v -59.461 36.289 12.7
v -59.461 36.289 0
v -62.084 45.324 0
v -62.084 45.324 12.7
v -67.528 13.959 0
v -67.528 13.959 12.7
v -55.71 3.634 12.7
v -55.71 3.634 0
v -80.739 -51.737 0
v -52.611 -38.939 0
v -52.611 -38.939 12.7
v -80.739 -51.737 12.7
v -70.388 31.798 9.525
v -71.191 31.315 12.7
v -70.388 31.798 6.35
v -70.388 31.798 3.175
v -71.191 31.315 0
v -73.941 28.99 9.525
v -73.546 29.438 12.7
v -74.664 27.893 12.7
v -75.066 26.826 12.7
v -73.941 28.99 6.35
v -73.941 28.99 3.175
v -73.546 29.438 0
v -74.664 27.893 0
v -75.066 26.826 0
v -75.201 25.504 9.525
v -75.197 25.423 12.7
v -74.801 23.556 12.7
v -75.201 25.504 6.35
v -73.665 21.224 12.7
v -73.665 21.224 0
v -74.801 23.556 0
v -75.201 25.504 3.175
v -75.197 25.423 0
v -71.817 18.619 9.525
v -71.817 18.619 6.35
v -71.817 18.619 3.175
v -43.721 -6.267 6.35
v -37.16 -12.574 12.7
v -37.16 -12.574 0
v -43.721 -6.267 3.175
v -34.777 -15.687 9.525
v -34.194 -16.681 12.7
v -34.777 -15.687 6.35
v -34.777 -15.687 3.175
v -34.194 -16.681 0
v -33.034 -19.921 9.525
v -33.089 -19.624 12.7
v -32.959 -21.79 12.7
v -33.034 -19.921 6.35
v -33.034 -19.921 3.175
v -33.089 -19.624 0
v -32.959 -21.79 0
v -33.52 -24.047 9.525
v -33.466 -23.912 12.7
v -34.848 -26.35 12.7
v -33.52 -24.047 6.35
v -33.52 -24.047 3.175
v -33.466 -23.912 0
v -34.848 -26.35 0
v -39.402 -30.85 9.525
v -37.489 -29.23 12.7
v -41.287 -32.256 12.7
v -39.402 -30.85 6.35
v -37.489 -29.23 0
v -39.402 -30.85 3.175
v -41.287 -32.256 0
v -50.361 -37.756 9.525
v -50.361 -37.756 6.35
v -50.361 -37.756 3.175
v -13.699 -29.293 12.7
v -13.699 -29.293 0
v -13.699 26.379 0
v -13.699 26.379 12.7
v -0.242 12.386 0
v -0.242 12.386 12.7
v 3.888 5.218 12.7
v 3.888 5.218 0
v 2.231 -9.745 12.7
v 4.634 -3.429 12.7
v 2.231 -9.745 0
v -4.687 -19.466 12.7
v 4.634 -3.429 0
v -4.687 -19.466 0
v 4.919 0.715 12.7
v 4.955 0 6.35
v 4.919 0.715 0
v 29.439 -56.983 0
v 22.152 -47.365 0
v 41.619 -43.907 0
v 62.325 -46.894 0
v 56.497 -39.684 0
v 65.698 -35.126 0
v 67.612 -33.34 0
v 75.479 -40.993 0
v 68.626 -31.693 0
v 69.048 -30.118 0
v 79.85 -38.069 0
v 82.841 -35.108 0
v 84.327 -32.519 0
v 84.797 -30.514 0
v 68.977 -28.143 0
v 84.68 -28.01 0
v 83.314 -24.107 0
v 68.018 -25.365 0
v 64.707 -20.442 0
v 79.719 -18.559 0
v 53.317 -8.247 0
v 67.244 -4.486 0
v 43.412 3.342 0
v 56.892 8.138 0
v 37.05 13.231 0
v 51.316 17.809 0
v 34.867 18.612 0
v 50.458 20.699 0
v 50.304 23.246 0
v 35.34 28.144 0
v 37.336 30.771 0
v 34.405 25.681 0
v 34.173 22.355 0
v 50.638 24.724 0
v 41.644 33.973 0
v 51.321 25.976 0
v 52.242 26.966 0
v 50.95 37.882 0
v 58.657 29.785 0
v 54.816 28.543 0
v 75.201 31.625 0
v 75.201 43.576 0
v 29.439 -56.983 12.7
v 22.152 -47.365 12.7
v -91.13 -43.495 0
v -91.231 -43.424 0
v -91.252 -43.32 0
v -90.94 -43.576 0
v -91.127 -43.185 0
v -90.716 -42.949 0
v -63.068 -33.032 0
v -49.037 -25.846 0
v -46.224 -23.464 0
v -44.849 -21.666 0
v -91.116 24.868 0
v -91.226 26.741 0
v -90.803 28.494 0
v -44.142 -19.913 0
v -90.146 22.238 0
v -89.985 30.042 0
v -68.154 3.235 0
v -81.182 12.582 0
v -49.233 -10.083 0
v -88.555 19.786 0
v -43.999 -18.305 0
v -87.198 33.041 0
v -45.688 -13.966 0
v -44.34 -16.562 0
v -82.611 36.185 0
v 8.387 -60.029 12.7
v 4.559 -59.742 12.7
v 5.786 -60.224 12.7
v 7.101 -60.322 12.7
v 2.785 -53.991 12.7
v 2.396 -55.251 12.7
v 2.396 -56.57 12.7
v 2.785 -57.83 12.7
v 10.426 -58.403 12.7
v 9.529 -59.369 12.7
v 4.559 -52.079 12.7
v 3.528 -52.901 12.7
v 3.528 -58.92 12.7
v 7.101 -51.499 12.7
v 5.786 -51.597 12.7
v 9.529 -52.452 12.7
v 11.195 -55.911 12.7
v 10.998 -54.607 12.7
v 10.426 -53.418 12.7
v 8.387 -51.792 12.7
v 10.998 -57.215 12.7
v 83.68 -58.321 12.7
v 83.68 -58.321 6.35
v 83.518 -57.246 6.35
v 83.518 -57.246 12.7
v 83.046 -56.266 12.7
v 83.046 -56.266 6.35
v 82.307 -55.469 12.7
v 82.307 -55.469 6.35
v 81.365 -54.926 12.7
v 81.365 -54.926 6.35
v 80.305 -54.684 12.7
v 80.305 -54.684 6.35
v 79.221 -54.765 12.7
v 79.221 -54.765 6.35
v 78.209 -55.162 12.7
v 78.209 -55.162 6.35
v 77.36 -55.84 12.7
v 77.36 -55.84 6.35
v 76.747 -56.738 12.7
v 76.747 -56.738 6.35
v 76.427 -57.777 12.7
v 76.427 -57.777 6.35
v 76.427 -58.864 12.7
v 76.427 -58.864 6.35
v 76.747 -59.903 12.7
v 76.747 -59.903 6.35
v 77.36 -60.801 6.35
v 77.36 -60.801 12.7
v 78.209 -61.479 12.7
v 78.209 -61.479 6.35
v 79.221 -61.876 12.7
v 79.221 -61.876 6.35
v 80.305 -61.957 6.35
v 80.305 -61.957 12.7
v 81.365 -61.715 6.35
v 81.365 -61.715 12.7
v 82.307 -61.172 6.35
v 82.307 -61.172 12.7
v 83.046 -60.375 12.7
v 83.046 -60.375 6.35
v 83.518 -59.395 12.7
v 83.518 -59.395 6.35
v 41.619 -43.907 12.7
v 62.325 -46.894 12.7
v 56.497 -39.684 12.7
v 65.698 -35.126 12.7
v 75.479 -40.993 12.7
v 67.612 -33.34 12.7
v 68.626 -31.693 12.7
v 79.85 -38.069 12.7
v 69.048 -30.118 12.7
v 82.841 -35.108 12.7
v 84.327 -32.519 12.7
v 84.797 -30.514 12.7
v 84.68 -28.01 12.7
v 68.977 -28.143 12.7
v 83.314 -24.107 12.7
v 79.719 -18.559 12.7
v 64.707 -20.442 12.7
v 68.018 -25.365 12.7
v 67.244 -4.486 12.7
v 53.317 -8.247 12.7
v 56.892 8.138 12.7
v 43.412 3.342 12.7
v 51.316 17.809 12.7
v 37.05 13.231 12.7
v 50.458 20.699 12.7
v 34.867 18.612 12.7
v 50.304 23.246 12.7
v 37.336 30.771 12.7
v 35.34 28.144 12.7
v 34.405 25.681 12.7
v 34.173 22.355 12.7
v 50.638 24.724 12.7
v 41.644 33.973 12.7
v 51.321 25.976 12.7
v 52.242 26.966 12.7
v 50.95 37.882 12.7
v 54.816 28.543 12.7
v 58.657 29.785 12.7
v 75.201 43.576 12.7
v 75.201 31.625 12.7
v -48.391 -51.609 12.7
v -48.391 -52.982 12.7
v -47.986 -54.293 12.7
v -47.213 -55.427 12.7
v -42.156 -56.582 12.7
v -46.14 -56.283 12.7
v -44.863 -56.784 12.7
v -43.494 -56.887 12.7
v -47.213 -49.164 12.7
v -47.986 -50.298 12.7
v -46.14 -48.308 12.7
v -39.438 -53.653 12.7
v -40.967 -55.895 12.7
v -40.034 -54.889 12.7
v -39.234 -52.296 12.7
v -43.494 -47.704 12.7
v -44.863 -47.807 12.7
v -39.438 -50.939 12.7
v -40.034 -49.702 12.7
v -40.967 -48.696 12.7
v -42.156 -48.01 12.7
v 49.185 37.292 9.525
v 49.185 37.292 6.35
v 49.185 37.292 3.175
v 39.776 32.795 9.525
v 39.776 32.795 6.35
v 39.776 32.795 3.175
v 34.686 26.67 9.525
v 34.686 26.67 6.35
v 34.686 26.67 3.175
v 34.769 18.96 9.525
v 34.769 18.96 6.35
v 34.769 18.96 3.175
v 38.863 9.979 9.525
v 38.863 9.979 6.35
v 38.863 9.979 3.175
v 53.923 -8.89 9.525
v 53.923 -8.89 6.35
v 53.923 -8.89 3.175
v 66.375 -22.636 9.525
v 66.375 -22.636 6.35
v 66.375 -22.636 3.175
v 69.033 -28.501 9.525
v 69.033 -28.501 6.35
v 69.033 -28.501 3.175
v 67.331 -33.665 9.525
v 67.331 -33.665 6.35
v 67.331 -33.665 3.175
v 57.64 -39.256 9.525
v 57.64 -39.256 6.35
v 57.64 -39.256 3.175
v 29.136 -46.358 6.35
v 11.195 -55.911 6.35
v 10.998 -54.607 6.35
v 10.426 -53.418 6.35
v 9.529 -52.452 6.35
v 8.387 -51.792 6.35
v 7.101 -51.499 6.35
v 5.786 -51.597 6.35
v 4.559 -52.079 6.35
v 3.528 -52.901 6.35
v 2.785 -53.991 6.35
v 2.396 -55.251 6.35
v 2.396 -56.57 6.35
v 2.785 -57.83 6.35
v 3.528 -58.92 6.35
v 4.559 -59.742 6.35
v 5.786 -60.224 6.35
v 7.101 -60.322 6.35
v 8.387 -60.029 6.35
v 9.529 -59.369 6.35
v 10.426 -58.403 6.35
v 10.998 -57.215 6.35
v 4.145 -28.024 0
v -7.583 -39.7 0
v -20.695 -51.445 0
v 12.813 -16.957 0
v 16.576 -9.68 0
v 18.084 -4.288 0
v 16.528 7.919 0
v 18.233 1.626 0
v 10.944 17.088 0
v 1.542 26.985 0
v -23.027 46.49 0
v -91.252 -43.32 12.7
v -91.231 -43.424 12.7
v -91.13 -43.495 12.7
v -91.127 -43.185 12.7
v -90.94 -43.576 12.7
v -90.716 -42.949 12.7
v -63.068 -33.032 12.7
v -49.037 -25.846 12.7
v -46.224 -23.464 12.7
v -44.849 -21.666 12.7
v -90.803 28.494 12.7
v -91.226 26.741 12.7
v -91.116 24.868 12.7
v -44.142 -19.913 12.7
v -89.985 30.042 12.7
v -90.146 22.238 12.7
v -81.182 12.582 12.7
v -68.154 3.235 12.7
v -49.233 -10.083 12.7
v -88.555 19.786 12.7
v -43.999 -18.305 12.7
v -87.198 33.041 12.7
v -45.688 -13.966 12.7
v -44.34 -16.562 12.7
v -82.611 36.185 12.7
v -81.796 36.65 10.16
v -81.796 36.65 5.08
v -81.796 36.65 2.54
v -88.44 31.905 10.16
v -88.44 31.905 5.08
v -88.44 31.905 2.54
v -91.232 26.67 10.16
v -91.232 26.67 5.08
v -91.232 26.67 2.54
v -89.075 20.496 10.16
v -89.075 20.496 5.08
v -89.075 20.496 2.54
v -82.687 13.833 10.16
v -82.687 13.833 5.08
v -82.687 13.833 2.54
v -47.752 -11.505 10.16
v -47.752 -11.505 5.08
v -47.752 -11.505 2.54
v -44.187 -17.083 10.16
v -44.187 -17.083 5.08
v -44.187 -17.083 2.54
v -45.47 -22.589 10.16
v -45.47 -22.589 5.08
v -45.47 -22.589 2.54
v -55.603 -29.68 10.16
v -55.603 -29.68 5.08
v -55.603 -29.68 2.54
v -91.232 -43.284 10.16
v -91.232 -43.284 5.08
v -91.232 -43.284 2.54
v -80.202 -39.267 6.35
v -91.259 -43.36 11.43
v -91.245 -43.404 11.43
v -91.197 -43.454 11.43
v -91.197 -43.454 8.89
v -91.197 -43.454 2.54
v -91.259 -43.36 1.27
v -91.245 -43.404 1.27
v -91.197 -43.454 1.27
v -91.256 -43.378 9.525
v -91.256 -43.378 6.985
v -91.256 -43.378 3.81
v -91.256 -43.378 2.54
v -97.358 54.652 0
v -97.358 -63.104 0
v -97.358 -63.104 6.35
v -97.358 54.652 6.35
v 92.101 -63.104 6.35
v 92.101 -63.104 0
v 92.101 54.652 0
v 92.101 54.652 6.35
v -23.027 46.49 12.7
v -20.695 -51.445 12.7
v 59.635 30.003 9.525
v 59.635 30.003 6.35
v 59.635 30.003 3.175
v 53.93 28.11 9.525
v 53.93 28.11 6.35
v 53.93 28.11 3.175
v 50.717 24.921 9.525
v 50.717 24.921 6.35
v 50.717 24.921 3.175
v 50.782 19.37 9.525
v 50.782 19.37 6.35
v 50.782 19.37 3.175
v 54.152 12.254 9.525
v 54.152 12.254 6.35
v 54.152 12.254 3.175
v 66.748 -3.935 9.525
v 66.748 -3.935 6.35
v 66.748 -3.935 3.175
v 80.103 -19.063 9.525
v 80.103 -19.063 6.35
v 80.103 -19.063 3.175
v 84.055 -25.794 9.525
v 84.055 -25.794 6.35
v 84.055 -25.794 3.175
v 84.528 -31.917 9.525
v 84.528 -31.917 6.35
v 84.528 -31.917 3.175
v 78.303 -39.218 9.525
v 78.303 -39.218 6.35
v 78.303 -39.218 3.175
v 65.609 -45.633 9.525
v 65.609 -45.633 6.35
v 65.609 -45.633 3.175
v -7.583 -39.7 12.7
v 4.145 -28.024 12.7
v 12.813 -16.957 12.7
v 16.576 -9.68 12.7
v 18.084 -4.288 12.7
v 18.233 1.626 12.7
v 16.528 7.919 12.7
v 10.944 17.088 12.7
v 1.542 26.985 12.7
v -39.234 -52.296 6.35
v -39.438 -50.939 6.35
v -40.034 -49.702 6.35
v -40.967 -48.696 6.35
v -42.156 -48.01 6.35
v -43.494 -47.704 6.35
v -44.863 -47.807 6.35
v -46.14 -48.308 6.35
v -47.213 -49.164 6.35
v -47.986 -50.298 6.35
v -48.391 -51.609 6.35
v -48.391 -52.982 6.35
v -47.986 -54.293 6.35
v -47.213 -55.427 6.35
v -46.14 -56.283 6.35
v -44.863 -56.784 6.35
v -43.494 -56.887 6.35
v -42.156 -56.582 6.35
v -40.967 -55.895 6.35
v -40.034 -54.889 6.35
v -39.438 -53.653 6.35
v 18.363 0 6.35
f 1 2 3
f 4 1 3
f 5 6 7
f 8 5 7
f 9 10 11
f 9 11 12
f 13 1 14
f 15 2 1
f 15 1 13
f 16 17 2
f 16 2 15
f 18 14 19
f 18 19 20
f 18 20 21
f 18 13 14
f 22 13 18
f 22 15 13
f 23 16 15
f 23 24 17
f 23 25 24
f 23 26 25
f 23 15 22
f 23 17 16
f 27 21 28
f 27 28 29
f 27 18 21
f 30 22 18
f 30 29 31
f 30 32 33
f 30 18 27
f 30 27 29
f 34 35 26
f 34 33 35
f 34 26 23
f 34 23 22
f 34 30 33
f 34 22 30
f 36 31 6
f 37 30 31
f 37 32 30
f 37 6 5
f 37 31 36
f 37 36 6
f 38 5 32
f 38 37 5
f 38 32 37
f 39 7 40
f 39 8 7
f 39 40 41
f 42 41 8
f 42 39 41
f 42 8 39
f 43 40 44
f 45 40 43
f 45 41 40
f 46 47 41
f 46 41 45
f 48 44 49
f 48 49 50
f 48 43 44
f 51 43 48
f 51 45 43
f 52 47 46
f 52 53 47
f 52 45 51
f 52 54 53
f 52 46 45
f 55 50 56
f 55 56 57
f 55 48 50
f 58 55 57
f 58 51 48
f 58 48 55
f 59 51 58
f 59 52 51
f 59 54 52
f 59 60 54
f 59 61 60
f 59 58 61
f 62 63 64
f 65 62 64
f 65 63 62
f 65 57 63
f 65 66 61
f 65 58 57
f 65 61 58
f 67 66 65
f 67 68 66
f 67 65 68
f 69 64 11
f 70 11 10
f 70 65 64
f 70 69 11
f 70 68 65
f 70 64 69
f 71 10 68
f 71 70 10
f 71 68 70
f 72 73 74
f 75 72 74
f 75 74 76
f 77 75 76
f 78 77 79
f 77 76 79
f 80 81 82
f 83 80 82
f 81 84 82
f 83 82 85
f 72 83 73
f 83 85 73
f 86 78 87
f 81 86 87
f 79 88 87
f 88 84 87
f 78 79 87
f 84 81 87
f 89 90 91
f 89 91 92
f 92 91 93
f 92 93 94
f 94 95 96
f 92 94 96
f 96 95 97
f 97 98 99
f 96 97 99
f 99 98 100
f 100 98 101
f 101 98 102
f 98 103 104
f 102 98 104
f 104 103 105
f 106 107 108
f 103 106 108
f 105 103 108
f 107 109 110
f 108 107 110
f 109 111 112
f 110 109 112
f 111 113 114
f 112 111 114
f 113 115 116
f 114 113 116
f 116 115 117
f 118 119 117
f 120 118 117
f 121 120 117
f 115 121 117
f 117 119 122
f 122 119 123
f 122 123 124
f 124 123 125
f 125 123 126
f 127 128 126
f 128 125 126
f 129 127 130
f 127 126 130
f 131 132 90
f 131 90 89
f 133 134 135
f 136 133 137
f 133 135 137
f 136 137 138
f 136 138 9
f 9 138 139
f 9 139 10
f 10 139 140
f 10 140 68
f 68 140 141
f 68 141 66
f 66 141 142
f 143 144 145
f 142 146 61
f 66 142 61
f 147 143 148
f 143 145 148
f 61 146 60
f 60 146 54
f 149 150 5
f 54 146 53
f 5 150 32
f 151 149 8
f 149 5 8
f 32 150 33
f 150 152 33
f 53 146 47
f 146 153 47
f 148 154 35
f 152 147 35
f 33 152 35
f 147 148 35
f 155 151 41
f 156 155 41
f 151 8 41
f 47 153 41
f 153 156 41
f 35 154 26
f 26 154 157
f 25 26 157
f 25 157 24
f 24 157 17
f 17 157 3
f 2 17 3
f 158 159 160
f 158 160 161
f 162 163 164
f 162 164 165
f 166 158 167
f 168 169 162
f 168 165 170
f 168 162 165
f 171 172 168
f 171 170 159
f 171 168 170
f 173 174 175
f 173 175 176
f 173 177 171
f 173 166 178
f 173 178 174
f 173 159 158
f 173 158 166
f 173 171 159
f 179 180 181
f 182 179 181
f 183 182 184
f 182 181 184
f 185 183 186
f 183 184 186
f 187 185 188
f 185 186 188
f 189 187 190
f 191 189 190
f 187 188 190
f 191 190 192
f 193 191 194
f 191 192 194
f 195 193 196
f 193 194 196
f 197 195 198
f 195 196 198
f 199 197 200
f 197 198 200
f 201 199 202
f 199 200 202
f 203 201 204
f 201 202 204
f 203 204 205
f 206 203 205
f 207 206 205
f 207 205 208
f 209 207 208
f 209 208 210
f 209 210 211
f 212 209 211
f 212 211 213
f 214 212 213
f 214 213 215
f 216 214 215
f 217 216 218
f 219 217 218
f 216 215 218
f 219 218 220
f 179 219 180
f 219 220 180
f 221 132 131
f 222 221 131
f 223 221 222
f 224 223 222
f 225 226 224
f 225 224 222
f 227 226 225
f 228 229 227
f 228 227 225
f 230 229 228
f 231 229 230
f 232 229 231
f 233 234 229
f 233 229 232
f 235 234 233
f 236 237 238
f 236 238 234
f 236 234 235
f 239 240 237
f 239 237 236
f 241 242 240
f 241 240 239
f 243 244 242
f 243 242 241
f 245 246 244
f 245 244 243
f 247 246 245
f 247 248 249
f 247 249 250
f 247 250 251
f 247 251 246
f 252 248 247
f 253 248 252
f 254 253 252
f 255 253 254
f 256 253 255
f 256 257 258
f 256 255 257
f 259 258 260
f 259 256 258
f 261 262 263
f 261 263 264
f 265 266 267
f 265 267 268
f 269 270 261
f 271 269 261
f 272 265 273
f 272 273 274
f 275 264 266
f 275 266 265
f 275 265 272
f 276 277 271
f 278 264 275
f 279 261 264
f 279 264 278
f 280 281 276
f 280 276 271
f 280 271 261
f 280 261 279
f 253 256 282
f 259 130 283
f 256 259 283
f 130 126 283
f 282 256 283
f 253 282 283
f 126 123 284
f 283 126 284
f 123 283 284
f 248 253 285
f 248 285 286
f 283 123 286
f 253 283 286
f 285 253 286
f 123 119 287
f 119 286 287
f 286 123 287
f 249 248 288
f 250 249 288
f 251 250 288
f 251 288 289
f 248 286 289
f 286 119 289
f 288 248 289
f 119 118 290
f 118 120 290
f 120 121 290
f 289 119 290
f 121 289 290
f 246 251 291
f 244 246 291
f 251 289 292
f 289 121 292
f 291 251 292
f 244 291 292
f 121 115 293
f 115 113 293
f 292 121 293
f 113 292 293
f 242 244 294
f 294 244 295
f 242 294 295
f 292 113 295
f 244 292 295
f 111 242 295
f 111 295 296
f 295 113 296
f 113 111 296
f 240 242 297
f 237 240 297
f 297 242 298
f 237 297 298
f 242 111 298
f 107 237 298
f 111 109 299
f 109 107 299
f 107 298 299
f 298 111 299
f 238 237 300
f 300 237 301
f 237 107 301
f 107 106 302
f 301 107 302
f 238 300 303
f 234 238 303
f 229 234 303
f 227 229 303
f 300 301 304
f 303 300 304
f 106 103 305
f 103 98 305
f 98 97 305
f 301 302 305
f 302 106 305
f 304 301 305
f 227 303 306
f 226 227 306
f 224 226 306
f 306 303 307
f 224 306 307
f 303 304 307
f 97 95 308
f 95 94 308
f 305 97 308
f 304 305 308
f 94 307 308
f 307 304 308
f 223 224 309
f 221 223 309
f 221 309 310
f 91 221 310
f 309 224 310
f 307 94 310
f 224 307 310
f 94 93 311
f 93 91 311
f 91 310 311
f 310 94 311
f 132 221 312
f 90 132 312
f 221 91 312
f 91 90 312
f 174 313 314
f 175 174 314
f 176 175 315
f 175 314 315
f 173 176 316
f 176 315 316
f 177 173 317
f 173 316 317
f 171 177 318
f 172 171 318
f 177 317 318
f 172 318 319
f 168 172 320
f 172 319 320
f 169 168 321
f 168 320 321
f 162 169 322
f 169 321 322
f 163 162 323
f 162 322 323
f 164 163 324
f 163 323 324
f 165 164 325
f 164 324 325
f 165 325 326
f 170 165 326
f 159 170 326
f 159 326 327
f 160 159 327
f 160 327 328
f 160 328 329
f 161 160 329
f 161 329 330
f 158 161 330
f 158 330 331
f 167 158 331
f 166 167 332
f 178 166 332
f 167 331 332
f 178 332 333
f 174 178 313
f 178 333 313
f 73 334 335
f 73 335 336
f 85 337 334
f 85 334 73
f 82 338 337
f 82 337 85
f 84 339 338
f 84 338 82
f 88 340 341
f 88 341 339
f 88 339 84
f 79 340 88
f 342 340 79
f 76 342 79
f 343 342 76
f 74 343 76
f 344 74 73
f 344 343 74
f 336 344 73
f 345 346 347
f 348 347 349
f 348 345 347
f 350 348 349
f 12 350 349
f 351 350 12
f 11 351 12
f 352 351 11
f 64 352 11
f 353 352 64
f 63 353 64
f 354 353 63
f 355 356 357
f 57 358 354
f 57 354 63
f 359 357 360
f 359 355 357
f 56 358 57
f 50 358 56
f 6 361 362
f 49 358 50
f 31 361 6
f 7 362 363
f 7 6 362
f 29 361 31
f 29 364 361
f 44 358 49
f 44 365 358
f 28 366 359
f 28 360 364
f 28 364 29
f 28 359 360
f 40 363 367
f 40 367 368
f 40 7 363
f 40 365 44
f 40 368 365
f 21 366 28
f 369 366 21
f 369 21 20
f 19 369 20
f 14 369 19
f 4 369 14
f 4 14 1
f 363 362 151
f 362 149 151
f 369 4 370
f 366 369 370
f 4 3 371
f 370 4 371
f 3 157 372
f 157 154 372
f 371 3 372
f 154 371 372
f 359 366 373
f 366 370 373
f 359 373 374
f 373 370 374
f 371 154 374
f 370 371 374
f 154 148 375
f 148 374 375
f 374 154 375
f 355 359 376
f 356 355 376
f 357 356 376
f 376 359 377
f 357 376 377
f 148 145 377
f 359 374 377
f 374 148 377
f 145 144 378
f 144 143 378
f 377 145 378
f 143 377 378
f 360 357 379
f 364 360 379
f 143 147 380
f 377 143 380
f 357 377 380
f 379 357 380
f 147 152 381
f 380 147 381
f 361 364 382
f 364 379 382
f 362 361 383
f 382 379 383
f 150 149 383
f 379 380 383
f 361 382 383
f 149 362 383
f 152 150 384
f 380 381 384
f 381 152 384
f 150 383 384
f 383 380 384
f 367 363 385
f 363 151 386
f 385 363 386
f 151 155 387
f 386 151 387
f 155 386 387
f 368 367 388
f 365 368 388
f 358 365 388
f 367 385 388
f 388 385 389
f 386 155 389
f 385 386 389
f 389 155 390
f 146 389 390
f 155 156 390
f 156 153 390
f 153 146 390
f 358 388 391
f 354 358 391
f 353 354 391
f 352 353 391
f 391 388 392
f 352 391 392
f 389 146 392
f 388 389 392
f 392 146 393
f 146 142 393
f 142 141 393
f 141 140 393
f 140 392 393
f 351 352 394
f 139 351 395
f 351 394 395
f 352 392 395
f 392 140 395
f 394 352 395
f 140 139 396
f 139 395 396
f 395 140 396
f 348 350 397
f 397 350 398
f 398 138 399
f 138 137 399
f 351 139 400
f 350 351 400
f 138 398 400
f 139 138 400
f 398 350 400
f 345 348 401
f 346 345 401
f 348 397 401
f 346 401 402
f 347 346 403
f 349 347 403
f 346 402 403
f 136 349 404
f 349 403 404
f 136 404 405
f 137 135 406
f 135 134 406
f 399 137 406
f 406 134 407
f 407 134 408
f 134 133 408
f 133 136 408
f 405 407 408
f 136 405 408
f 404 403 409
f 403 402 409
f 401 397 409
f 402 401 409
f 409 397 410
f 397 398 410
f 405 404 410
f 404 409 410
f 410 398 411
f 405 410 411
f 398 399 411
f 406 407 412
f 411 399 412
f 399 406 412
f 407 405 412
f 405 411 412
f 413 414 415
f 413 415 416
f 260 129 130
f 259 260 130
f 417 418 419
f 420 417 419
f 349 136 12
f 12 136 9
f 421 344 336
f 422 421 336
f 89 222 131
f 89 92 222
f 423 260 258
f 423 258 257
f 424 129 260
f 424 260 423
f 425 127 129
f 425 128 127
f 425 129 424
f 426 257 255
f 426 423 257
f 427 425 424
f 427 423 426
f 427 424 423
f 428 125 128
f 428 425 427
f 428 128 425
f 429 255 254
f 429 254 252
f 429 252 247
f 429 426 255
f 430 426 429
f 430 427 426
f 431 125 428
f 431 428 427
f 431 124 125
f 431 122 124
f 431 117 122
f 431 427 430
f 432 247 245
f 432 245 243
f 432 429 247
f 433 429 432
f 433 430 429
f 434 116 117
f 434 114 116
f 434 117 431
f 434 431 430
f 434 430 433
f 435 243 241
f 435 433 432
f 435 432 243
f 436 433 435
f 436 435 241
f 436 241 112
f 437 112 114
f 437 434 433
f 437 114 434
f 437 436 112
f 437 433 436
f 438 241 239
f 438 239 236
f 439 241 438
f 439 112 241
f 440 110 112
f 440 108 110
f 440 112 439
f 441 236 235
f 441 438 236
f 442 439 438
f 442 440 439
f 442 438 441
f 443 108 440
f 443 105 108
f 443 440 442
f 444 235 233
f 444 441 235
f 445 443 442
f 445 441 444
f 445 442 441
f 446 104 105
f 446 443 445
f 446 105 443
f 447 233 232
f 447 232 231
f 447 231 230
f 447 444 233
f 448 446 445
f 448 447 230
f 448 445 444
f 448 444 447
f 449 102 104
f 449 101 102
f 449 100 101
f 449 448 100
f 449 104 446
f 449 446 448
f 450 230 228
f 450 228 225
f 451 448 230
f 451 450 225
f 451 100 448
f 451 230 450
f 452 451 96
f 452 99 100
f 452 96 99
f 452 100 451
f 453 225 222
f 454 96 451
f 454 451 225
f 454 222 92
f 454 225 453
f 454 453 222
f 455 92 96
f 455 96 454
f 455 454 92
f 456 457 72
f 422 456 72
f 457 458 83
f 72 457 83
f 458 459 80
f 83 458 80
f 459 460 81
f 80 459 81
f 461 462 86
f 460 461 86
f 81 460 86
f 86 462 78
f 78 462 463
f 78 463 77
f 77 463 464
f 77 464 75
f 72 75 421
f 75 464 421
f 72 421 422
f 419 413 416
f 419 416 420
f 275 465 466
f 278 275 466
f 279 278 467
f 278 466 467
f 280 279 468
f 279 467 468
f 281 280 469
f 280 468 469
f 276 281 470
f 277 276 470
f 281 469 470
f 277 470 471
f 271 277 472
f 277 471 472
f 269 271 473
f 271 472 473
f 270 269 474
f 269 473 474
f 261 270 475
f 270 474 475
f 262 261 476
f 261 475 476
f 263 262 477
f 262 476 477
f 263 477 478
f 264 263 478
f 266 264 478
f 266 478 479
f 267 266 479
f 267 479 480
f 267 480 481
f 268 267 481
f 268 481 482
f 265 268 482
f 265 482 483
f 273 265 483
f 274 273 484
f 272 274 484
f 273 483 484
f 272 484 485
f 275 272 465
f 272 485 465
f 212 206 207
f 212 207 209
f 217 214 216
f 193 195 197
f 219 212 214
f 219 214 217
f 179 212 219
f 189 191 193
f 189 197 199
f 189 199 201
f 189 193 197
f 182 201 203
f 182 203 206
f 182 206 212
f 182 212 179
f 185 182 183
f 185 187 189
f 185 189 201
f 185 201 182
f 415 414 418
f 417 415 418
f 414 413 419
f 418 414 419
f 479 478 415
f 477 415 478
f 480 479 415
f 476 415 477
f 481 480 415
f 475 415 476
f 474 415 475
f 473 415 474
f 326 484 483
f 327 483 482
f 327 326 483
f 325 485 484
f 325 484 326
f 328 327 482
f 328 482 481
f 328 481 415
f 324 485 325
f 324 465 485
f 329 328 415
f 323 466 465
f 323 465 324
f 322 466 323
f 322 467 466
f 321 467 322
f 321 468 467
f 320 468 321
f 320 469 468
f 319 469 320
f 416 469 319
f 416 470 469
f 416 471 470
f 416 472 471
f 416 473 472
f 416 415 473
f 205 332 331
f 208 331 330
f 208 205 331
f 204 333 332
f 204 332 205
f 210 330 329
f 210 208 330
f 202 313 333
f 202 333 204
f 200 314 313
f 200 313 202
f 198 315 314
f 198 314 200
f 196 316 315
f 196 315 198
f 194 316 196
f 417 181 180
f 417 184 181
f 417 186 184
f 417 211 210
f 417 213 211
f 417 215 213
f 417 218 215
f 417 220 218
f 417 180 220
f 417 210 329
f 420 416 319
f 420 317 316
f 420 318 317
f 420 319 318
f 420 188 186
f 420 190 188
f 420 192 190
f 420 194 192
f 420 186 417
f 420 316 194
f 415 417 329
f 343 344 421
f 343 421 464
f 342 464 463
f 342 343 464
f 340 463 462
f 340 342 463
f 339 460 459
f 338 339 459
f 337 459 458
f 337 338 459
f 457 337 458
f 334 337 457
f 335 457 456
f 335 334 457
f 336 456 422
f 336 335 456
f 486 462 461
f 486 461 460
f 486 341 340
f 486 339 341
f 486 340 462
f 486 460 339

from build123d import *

# Parameters (mm, degrees)
F3_DEPTH = 12.7
F4_DEPTH = 12.7
F5_DEPTH = 12.7
F6_W     = 189.4590184093
F6_H     = 117.7560687065
F7_DEPTH = 6.35
F8_R     = 4.6041811727
F8_R_2   = 4.424061419
F8_R_3   = 3.6468937029
F9_DEPTH = 6.35


with BuildPart() as f3:
    # F0 (on Top) → F3 (new body)
    with BuildSketch(Plane.XY):
        with BuildLine():
            Line((-59.4609826803, 36.288689822), (-62.0842650533, 45.3244261444))
            add(Edge.make_bspline(
                [(-62.0842650533, 45.3244261444), (-76.3669330782, 39.6868441897), (-105.7448762698, 28.0909321294), (-64.4918275462, 0.7228788045), (-24.7548755706, -25.0754315136), (-93.4949776884, -42.5917245464), (-91.1362632101, -43.5001144041), (-90.9403264523, -43.5755737126)],
                knots=[0, 0, 0, 0, 0.2335267828, 0.480339986, 0.6931834494, 0.9745129643, 1, 1, 1, 1], degree=3))
            Line((-90.9403264523, -43.5755737126), (-80.7386860251, -51.7368838191))
            add(Edge.make_bspline(
                [(-59.4609826803, 36.288689822), (-67.4253888039, 33.4956167621), (-87.5836308704, 26.4262330595), (-42.3735586434, -5.2578557722), (-23.9135235399, -27.3126732704), (-58.9828392703, -42.3859315549), (-80.7386860251, -51.7368838191)],
                knots=[0, 0, 0, 0, 0.1900652595, 0.4810630511, 0.6780686335, 1, 1, 1, 1], degree=3))
        make_face()
    extrude(amount=F3_DEPTH)


with BuildPart() as f4:
    # F1 (on Top) → F4 (new body)
    with BuildSketch(Plane.XY):
        with BuildLine():
            add(Edge.make_bspline(
                [(-23.0265576392, 46.4903302491), (-2.6472799904, 31.3247734038), (38.4919362924, 0.7103849129), (-0.8445311949, -33.9532307058), (-20.6947550178, -51.4454096556)],
                knots=[0, 0, 0, 0, 0.4953735022, 1, 1, 1, 1], degree=3))
            Line((-23.0265576392, 46.4903302491), (-20.6947550178, -51.4454096556))
        make_face()
        with BuildLine():
            Line((-13.6993452907, -29.2932782322), (-13.6993452907, 26.3785235584))
            add(Edge.make_bspline(
                [(-13.6993452907, 26.3785235584), (-4.4824398683, 17.7391465856), (14.2904119764, 0.1425958444), (-4.2577650903, -19.3638900203), (-13.6993452907, -29.2932782322)],
                knots=[0, 0, 0, 0, 0.4909699122, 1, 1, 1, 1], degree=3))
        make_face(mode=Mode.SUBTRACT)
    extrude(amount=F4_DEPTH)


with BuildPart() as f5:
    # F2 (on Top) → F5 (new body)
    with BuildSketch(Plane.XY):
        with BuildLine():
            Line((75.2006545663, 31.6250808537), (75.2006545663, 43.5755737126))
            add(Edge.make_bspline(
                [(75.2006545663, 43.5755737126), (56.5777478813, 39.8688188665), (20.0832153378, 32.6048461876), (51.7347867803, -8.9273077443), (85.7886877069, -38.0543402289), (26.1027467349, -47.0160293906), (22.1521314234, -47.3647527397)],
                knots=[0, 0, 0, 0, 0.2555612663, 0.5008127413, 0.7055319989, 0.9705506898, 0.9705506898, 0.9705506898, 0.9705506898], degree=3))
            Line((22.1521314234, -47.3647527397), (29.439015314, -56.9834411144))
            add(Edge.make_bspline(
                [(75.2006545663, 31.6250808537), (64.0851156024, 30.9276837233), (40.294095329, 29.4350175267), (66.0785582397, -5.2614639278), (100.7634719015, -36.9686299494), (55.4687942528, -49.679058648), (29.439015314, -56.9834411144)],
                knots=[0, 0, 0, 0, 0.2071581808, 0.4433887098, 0.6801286687, 1, 1, 1, 1], degree=3))
        make_face()
    extrude(amount=F5_DEPTH)


with BuildPart() as f7:
    # F6 (on Top) → F7 (new body)
    with BuildSketch(Plane.XY):
        with Locations((-2.6280246675, -4.2263939977)):
            Rectangle(F6_W, F6_H)
    extrude(amount=F7_DEPTH)

    # F8 (on face) → F9 (join)
    with BuildSketch(Plane.XY.offset(6.35)):
        with Locations((-43.8379943371, -52.295692265)):
            Circle(F8_R)
        with Locations((6.7707402632, -55.9106059372)):
            Circle(F8_R_2)
        with Locations((80.0329074264, -58.3205446601)):
            Circle(F8_R_3)
    extrude(amount=F9_DEPTH)


solid = Compound([f3.part, f4.part, f5.part, f7.part])
